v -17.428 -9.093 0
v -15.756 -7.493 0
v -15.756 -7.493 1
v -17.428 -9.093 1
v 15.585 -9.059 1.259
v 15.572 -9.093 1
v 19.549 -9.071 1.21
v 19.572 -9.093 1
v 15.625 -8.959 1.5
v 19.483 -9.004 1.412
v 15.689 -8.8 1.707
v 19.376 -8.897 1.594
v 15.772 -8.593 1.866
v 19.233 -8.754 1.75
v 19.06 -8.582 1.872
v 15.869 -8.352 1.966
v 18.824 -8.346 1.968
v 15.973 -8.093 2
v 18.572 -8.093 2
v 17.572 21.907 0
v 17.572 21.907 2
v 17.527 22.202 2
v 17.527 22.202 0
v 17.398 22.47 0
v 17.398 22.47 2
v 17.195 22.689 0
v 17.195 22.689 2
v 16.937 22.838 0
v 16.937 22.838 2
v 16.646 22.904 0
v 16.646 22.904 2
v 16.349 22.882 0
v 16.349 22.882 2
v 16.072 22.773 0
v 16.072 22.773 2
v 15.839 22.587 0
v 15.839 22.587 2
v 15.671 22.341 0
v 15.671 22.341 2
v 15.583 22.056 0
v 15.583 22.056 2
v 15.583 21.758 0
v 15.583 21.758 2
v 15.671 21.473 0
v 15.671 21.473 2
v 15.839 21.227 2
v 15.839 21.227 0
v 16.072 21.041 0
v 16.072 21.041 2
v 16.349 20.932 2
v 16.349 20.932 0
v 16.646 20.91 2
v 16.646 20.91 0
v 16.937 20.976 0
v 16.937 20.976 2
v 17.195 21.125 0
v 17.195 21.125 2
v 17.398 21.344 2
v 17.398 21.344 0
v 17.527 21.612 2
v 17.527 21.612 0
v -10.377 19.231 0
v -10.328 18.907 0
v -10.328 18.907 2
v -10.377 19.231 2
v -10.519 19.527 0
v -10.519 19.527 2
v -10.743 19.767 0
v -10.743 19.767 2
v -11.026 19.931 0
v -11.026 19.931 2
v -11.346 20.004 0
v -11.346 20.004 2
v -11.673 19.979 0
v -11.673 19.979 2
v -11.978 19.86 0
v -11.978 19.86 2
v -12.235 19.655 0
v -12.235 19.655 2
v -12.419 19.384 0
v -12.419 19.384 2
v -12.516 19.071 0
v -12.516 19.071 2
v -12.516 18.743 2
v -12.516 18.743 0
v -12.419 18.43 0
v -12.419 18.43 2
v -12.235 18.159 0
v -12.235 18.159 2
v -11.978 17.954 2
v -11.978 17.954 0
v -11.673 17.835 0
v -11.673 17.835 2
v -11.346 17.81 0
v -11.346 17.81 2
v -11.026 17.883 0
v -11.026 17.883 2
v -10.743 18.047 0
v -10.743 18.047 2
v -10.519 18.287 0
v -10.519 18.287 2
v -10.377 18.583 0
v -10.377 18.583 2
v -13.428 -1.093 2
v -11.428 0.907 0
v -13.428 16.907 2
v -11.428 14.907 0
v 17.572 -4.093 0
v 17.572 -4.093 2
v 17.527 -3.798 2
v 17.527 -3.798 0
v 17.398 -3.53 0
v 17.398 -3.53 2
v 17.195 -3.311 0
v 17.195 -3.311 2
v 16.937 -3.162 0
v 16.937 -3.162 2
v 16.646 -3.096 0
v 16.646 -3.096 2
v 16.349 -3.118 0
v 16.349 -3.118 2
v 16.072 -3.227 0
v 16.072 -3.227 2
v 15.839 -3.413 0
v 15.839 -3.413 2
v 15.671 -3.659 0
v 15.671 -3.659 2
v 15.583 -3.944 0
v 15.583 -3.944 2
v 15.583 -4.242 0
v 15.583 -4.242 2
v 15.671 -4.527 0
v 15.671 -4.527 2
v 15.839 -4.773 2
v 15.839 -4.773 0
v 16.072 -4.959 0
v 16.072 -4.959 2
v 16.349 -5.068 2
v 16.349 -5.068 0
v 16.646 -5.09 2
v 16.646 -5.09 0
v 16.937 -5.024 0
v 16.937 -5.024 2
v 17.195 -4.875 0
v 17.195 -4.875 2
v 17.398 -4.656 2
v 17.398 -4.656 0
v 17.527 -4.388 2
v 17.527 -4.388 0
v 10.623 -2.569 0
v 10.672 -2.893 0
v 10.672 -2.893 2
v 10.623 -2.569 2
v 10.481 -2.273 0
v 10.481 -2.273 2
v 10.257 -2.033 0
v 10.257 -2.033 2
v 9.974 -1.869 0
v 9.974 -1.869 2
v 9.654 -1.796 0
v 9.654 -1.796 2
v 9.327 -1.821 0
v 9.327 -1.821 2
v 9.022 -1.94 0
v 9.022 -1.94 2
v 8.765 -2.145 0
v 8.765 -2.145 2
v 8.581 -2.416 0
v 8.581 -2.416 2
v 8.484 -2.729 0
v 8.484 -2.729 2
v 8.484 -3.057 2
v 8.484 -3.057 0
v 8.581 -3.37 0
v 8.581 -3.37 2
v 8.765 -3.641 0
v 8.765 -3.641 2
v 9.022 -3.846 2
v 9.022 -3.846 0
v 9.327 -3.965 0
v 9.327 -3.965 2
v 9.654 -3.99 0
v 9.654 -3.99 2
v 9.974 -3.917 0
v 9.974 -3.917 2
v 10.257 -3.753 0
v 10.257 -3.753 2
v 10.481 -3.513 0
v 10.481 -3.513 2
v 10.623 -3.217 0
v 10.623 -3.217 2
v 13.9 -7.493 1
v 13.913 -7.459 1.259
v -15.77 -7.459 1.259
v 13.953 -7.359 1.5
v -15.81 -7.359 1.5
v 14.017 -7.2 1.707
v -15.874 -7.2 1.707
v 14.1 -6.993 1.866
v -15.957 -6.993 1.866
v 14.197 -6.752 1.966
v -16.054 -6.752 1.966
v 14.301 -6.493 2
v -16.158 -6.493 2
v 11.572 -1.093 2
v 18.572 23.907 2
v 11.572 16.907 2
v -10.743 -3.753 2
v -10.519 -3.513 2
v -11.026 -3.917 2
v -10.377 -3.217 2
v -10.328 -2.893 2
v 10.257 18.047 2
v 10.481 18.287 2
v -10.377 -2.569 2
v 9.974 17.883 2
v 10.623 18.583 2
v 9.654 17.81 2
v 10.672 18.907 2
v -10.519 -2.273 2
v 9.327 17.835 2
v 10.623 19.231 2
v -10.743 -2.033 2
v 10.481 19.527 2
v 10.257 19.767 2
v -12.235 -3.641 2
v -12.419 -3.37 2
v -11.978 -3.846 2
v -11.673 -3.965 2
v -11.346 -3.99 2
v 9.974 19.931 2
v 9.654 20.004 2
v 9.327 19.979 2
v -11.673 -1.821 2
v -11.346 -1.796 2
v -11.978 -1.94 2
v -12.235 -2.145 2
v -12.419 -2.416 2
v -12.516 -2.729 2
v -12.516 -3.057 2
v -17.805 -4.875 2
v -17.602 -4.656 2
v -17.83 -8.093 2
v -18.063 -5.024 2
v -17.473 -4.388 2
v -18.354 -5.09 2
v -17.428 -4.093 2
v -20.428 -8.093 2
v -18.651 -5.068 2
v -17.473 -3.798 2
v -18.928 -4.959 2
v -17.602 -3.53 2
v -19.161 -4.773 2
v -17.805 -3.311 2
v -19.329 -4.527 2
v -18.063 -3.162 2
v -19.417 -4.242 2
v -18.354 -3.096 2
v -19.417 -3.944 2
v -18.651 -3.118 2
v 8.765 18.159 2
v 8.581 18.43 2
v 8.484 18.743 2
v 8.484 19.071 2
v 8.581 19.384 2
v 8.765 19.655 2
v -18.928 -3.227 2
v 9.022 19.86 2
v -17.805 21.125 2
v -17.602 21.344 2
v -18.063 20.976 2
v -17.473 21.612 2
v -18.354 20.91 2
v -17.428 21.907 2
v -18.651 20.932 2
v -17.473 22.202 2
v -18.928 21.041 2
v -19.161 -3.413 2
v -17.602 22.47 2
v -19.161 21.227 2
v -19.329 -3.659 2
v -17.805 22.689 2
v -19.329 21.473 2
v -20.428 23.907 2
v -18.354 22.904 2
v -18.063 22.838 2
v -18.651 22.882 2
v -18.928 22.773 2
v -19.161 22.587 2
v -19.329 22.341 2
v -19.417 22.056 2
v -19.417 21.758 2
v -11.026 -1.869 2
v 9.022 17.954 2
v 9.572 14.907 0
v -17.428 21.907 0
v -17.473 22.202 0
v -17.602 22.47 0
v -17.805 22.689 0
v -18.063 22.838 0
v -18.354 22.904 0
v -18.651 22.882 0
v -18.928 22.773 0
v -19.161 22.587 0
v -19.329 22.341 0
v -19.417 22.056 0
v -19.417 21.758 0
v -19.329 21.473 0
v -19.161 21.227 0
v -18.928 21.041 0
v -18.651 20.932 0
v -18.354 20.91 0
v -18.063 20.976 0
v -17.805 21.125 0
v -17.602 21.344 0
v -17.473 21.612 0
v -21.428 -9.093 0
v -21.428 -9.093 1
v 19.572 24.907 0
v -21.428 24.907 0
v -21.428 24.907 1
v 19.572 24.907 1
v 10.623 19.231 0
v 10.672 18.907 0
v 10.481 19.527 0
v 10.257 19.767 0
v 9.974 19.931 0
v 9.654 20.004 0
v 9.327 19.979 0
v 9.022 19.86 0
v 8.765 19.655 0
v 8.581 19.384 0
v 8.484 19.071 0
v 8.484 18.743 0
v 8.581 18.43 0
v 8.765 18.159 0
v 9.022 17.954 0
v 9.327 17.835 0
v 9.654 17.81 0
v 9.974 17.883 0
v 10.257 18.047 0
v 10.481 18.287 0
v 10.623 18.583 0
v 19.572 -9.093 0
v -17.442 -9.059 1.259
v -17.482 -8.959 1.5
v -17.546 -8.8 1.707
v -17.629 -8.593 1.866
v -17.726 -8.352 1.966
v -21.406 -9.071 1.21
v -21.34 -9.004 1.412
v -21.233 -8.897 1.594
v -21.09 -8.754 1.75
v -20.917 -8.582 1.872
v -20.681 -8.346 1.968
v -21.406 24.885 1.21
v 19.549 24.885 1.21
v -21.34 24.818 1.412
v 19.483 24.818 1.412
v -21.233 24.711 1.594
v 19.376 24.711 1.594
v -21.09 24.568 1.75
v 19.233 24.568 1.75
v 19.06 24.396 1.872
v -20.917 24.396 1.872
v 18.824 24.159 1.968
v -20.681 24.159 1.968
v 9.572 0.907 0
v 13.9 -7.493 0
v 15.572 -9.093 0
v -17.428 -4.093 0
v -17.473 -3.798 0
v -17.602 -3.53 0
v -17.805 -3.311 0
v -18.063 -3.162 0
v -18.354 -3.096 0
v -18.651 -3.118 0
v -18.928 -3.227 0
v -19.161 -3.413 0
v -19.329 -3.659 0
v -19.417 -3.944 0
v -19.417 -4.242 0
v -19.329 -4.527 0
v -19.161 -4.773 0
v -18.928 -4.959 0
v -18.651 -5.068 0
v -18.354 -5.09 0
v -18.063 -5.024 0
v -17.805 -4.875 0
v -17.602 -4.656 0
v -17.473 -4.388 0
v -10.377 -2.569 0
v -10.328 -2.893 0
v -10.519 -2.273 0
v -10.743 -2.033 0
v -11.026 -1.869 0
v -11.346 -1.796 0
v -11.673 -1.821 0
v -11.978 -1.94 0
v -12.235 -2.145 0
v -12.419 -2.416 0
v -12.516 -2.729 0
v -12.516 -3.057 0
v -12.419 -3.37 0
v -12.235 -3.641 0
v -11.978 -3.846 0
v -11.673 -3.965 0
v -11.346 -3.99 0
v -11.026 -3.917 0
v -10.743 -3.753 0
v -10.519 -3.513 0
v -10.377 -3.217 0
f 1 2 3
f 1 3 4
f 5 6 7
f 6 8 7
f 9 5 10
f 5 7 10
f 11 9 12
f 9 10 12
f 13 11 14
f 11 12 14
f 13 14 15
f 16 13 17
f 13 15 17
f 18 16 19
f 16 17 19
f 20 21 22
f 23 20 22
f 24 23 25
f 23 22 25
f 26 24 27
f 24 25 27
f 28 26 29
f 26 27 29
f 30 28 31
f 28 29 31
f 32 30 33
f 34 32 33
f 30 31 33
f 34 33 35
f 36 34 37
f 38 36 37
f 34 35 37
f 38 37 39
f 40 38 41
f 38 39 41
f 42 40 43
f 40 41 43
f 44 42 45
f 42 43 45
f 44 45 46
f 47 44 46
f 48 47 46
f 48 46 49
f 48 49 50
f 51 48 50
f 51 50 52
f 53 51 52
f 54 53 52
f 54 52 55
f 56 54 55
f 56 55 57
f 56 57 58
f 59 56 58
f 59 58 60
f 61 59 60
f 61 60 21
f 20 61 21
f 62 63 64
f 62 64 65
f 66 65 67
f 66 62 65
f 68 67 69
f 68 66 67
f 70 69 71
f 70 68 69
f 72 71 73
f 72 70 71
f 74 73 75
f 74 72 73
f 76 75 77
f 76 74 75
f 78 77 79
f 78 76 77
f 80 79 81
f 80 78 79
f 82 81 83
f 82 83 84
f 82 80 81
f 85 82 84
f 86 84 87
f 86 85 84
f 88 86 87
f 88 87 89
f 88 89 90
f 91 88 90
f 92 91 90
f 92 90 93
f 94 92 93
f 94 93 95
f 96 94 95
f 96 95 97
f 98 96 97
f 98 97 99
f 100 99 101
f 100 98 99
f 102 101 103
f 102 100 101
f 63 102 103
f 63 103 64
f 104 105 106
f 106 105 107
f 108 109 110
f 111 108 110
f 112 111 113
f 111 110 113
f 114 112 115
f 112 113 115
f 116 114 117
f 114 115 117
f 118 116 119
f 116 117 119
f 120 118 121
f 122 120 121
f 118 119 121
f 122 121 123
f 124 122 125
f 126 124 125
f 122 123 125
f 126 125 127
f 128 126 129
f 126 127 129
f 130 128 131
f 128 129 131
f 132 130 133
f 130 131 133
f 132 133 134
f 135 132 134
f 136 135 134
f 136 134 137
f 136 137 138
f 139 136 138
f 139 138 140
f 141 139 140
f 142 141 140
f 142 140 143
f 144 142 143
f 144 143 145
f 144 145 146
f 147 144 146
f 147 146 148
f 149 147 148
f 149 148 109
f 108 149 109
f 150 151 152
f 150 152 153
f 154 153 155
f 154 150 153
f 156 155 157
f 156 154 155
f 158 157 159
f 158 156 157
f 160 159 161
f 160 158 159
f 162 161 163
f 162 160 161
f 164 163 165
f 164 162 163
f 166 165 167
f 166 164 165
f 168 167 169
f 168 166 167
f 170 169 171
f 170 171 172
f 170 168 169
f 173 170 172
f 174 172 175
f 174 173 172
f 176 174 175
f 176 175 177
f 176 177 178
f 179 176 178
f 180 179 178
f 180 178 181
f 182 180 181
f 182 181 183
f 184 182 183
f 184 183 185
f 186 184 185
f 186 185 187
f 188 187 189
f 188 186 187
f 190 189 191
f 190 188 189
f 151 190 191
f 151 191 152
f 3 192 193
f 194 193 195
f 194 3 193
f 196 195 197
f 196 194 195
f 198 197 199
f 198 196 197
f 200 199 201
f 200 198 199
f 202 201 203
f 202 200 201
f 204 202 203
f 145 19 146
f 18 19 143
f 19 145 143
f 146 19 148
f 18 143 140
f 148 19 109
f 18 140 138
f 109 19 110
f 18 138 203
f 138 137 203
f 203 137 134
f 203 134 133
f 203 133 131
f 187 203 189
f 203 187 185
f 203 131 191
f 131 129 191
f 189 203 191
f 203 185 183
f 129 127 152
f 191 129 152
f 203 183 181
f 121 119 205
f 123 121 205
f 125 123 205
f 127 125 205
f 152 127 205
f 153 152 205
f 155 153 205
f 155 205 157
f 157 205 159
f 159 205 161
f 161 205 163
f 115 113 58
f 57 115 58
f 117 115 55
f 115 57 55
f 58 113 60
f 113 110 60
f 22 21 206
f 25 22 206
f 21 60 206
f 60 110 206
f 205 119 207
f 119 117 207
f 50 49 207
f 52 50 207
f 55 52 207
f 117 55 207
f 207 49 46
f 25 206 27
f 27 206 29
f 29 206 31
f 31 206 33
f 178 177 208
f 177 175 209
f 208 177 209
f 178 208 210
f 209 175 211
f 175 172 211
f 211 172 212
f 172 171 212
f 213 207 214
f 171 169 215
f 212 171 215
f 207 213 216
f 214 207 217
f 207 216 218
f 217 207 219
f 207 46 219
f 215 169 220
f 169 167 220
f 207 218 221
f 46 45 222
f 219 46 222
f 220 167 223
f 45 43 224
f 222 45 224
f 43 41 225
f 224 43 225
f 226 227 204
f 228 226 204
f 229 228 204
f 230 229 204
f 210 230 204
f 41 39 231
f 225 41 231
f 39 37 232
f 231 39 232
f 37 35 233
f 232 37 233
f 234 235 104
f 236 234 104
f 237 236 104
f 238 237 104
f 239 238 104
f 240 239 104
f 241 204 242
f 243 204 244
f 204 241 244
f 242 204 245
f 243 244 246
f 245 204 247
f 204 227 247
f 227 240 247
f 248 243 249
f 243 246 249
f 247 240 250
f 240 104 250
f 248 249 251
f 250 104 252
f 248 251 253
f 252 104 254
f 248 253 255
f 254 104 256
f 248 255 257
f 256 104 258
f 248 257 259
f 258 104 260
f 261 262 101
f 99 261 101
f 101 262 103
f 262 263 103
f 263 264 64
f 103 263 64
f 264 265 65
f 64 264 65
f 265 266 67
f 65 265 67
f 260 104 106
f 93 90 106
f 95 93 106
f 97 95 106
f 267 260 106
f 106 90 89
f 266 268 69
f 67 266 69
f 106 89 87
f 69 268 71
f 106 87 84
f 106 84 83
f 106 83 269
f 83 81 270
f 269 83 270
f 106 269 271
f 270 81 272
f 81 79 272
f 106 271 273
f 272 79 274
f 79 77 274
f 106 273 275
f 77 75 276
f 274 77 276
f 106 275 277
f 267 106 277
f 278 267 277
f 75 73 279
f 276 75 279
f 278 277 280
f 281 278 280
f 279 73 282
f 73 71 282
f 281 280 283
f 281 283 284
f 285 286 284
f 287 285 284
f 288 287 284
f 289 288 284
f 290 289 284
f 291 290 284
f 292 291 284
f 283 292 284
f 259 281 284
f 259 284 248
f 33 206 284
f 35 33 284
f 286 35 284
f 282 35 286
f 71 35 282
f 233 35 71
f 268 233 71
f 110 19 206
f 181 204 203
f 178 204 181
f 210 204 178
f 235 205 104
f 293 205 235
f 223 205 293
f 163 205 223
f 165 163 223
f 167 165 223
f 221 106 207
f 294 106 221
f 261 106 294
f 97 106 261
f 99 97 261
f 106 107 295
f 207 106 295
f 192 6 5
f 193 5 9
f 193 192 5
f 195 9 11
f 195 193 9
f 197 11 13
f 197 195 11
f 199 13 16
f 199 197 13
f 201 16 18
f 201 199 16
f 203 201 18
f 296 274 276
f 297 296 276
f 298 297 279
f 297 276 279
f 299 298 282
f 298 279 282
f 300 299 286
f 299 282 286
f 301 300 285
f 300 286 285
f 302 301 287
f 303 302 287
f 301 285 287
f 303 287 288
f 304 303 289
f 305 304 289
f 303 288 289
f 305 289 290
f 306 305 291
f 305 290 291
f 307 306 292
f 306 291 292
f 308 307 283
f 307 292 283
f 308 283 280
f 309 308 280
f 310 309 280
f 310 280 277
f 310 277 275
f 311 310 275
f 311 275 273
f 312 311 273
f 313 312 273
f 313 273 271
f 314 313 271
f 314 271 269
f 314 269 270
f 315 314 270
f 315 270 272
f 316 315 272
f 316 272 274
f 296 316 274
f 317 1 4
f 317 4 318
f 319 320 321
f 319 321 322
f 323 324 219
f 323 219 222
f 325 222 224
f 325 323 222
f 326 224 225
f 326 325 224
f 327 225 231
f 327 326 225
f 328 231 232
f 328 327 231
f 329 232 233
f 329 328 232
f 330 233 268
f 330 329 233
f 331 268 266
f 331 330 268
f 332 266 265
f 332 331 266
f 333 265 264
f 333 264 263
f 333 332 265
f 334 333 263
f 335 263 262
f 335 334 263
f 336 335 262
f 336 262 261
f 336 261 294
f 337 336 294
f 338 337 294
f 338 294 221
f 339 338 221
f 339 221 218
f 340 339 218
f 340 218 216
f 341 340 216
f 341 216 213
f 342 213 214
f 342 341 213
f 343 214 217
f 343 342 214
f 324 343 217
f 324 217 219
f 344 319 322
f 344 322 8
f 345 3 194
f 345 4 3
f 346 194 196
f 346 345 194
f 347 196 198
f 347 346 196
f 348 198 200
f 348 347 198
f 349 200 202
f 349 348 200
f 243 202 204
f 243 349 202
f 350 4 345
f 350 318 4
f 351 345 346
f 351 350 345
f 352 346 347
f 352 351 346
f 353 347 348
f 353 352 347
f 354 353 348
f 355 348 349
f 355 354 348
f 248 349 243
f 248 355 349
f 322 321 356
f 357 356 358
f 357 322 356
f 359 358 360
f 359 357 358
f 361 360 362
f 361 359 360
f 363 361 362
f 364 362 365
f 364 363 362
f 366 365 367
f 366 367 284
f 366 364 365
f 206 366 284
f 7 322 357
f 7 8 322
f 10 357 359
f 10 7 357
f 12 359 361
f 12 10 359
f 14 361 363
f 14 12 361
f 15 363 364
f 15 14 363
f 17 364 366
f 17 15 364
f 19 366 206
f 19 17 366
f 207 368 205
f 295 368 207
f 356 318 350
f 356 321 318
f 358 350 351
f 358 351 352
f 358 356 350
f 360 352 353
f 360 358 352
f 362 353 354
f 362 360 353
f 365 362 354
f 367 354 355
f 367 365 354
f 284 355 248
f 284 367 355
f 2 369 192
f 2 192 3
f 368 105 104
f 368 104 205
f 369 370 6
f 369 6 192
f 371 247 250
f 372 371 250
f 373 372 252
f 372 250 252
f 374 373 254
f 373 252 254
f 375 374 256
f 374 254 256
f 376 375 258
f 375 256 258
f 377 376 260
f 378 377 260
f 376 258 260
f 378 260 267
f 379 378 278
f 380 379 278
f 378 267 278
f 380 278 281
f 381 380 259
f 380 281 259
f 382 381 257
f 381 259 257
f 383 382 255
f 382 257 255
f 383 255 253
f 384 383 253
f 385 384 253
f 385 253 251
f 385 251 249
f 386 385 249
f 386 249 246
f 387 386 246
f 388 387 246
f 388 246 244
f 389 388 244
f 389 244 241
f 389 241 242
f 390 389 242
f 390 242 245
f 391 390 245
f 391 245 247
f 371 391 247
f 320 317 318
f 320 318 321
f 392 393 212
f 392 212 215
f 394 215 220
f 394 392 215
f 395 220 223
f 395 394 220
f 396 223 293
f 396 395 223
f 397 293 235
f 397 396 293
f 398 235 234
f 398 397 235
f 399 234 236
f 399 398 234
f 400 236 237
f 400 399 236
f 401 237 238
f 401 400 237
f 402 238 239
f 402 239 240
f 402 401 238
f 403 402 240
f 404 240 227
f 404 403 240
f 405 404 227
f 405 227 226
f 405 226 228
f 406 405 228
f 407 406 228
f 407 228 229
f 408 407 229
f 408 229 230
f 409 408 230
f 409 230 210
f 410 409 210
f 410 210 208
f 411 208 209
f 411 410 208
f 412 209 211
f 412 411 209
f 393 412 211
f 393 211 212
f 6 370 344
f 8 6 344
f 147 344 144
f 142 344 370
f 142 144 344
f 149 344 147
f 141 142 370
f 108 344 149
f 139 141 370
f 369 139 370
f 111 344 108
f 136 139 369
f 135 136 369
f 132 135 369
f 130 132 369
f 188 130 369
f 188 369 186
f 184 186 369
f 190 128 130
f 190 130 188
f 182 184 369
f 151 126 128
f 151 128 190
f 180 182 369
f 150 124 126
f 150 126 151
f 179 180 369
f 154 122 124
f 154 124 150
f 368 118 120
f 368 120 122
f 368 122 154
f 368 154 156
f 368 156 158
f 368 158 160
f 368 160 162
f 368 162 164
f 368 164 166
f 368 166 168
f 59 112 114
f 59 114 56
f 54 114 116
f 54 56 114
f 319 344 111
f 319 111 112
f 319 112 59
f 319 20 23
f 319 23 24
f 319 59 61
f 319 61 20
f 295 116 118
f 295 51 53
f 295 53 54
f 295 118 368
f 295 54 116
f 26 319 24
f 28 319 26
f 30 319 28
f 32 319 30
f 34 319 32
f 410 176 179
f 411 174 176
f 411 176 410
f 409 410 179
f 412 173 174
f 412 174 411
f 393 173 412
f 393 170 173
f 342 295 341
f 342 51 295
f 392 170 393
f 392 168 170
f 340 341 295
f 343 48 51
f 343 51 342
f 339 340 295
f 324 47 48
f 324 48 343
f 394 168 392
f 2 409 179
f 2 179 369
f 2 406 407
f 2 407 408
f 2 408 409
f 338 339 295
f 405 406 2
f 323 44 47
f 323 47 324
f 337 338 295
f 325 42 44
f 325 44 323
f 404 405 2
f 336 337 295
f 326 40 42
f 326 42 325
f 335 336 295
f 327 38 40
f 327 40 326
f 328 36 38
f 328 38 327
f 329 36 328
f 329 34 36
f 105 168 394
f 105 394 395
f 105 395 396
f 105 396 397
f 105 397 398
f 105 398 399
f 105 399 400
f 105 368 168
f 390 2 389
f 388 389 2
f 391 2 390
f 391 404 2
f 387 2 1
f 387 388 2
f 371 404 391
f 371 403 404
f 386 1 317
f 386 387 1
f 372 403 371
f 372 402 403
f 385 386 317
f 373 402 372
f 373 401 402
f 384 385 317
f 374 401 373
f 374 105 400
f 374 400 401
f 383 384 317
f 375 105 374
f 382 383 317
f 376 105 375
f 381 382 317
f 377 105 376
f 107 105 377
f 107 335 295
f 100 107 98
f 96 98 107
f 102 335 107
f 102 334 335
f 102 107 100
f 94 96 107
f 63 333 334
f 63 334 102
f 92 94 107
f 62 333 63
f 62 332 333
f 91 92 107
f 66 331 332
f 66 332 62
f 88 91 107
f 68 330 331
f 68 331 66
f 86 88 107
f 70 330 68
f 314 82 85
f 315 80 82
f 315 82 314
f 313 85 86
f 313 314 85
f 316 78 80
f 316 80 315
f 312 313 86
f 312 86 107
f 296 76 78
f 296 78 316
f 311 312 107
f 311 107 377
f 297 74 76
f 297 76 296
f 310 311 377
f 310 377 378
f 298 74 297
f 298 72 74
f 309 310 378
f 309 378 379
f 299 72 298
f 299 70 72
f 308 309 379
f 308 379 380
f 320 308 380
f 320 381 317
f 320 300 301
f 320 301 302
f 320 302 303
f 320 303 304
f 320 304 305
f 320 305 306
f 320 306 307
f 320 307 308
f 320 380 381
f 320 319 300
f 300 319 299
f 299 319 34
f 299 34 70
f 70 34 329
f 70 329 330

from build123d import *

# Parameters (mm, degrees)
SKETCH_1_R          = 1.1
SKETCH_1_W          = 21
SKETCH_1_H          = 14
EXTRUDE_1_DEPTH     = 2
FILLET_2_R          = 1
SKETCH_11_R         = 1
CUT_EXTRUDE_1_DEPTH = 33.917032345
CHAMFER_1_SIZE      = 2


with BuildPart() as part:
    # 草图1 → 凸台-拉伸1 (new body)
    with BuildSketch(Plane.XY):
        Polygon((-21.428351104, 24.906962627), (19.571648896, 24.906962627), (19.571648896, -9.093037373), (17.69677195, -9.093037373), (15.571648896, -9.093037373), (13.89965532, -7.493037373), (-15.756357529, -7.493037373), (-17.428351104, -9.093037373), (-21.428351104, -9.093037373), align=None)
        with Locations((-11.428351104, 18.906962627)):
            Circle(SKETCH_1_R, mode=Mode.SUBTRACT)
        with Locations((-11.428351104, -2.893037373)):
            Circle(SKETCH_1_R, mode=Mode.SUBTRACT)
        with Locations((9.571648896, 18.906962627)):
            Circle(SKETCH_1_R, mode=Mode.SUBTRACT)
        with Locations((9.571648896, -2.893037373)):
            Circle(SKETCH_1_R, mode=Mode.SUBTRACT)
        with Locations((-0.928351104, 7.906962627)):
            Rectangle(SKETCH_1_W, SKETCH_1_H, mode=Mode.SUBTRACT)
    extrude(amount=EXTRUDE_1_DEPTH)

    # 圆角2
    fillet_2_edges = [part.edges().sort_by_distance(p)[0] for p in [
        (-16.592354317, -8.293037373, 2),
        (-0.928351104, -7.493037373, 2),
        (14.735652108, -8.293037373, 2),
        (17.571648896, -9.093037373, 2),
        (19.571648896, 7.906962627, 2),
        (-0.928351104, 24.906962627, 2),
        (-21.428351104, 7.906962627, 2),
        (-19.428351104, -9.093037373, 2),
    ]]
    fillet(fillet_2_edges, radius=FILLET_2_R)

    # 草图11 → 切除-拉伸1 (cut, through all)
    with BuildSketch(Plane.XY.offset(2)):
        with Locations((-18.428351104, 21.906962627)):
            Circle(SKETCH_11_R)
        with Locations((-18.428351104, -4.093037373)):
            Circle(SKETCH_11_R)
        with Locations((16.571648896, 21.906962627)):
            Circle(SKETCH_11_R)
        with Locations((16.571648896, -4.093037373)):
            Circle(SKETCH_11_R)
    extrude(amount=-CUT_EXTRUDE_1_DEPTH, mode=Mode.SUBTRACT)

    # 倒角1
    chamfer_1_edges = [part.edges().sort_by_distance(p)[0] for p in [
        (-0.928351104, 0.906962627, 2),
        (9.571648896, 7.906962627, 2),
        (-11.428351104, 7.906962627, 2),
        (-0.928351104, 14.906962627, 2),
    ]]
    chamfer(chamfer_1_edges, length=CHAMFER_1_SIZE - 0.0001)  # a hair under: the kernel refuses the full size


solid = part.part
